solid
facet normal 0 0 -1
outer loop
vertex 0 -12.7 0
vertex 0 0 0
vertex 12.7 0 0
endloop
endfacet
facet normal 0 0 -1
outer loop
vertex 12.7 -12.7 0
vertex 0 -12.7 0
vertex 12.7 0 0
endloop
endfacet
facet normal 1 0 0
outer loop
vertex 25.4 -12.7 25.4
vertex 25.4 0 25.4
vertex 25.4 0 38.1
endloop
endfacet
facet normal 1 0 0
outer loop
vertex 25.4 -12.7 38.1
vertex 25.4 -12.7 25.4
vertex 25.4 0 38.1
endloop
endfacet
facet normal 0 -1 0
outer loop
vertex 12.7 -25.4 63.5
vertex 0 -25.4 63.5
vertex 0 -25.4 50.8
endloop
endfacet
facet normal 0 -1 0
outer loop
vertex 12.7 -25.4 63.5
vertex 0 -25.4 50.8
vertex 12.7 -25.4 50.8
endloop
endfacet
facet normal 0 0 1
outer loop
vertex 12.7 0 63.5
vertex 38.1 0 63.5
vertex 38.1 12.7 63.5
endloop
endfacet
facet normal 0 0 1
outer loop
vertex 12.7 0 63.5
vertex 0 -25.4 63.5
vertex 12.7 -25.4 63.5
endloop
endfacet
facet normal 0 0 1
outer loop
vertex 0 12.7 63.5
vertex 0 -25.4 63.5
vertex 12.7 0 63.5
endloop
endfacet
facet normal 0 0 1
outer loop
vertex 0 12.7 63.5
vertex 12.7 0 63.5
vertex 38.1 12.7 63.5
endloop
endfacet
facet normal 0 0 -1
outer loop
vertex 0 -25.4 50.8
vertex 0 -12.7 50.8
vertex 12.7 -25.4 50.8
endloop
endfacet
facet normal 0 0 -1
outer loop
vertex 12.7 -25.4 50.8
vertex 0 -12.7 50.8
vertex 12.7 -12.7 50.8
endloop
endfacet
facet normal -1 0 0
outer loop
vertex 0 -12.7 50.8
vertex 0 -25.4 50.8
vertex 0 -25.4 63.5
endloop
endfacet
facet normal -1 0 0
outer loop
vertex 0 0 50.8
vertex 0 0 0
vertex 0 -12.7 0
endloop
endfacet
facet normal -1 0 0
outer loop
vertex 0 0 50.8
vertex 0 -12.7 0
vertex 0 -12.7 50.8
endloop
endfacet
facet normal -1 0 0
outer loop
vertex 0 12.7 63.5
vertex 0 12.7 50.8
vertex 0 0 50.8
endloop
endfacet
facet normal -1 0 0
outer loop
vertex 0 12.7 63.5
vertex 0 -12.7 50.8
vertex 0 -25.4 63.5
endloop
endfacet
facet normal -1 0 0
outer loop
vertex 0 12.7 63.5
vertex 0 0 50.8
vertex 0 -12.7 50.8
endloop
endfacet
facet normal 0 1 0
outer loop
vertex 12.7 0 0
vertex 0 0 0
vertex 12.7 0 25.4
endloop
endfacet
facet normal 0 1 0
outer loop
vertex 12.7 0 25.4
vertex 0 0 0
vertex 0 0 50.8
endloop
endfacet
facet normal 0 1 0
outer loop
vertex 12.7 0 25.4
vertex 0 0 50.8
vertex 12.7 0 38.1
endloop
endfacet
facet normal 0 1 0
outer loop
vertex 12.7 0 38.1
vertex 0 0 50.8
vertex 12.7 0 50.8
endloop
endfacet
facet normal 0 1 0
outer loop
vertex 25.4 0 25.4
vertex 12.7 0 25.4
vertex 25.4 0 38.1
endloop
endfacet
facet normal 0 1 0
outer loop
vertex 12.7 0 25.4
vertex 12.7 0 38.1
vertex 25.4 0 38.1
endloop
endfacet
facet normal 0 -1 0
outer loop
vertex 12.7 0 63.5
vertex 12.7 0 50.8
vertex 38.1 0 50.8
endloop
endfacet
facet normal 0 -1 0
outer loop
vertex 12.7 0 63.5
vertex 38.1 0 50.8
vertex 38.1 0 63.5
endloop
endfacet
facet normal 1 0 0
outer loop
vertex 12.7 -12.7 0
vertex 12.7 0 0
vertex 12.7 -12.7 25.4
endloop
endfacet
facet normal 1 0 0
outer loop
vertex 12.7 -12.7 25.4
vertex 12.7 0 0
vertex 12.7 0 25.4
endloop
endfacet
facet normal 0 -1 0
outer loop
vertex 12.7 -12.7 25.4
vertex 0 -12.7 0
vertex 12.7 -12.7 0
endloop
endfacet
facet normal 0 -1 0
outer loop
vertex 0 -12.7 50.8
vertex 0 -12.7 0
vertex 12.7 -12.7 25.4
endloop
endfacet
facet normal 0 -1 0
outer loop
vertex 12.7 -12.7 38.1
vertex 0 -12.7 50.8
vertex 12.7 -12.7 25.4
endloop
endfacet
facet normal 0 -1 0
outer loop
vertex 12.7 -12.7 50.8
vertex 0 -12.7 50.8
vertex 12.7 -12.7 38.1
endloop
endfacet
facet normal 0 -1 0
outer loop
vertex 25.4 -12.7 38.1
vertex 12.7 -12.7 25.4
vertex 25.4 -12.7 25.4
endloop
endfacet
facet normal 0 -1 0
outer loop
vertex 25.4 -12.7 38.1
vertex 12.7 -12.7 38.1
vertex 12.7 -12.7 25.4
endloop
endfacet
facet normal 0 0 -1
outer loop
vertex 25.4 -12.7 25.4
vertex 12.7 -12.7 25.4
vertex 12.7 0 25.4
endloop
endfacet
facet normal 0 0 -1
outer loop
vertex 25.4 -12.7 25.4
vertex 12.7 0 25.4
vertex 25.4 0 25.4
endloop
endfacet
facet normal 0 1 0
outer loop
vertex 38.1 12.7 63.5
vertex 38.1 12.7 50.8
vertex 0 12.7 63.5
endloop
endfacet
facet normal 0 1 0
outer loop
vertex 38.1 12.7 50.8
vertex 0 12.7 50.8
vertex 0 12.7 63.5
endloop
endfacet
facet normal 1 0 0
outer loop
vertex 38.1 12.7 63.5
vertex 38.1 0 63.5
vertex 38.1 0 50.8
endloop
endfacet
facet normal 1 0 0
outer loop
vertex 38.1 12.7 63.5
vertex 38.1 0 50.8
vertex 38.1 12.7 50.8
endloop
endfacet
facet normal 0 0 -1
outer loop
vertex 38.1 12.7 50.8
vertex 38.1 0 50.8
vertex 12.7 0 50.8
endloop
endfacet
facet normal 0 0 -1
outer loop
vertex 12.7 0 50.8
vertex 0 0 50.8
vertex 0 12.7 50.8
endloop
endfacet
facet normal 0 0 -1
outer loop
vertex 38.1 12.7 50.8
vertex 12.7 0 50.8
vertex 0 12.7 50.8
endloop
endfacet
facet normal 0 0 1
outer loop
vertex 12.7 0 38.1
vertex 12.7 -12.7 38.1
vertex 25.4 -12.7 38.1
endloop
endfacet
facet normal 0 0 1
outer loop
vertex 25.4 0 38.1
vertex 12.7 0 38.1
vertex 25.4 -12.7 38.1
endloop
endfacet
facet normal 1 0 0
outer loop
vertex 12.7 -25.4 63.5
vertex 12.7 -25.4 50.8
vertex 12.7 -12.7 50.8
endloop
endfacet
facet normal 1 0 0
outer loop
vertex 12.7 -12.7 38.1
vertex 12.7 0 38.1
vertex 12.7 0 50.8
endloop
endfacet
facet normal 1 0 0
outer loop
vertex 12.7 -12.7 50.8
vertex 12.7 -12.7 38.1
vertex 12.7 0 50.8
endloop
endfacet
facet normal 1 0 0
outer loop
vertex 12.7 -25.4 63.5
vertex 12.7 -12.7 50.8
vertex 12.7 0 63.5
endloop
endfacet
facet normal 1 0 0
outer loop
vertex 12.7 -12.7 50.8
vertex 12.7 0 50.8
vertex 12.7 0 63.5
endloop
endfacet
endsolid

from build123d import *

# Parameters (mm, degrees)
F0_W          = 12.7
F0_H          = 12.7
F1_DEPTH      = 12.7
F2_W          = 12.7
F2_H          = 12.7
F3_DEPTH      = 12.7
F3_DEPTH_BACK = 25.4
F4_W          = 12.7
F4_H          = 12.7
F5_DEPTH      = 25.4


with BuildPart() as f1:
    # F0 (on Front) → F1 (new body)
    with BuildSketch(Plane.XZ):
        Polygon((0, 63.5), (0, 0), (12.7, 0), (12.7, 25.4), (12.7, 38.1), (12.7, 63.5), align=None)
        with Locations((19.05, 31.75)):
            Rectangle(F0_W, F0_H)
    extrude(amount=F1_DEPTH)

    # F2 (on face) → F3 (join, two sides)
    with BuildSketch(Plane.XZ.offset(12.7)) as f3_sk:
        with Locations((6.35, 57.15)):
            Rectangle(F2_W, F2_H)
    extrude(amount=F3_DEPTH)
    extrude(f3_sk.sketch, amount=-F3_DEPTH_BACK)

    # F4 (on face) → F5 (join)
    with BuildSketch(Plane.YZ.offset(12.7)):
        with Locations((6.35, 57.15)):
            Rectangle(F4_W, F4_H)
    extrude(amount=F5_DEPTH)


solid = f1.part
